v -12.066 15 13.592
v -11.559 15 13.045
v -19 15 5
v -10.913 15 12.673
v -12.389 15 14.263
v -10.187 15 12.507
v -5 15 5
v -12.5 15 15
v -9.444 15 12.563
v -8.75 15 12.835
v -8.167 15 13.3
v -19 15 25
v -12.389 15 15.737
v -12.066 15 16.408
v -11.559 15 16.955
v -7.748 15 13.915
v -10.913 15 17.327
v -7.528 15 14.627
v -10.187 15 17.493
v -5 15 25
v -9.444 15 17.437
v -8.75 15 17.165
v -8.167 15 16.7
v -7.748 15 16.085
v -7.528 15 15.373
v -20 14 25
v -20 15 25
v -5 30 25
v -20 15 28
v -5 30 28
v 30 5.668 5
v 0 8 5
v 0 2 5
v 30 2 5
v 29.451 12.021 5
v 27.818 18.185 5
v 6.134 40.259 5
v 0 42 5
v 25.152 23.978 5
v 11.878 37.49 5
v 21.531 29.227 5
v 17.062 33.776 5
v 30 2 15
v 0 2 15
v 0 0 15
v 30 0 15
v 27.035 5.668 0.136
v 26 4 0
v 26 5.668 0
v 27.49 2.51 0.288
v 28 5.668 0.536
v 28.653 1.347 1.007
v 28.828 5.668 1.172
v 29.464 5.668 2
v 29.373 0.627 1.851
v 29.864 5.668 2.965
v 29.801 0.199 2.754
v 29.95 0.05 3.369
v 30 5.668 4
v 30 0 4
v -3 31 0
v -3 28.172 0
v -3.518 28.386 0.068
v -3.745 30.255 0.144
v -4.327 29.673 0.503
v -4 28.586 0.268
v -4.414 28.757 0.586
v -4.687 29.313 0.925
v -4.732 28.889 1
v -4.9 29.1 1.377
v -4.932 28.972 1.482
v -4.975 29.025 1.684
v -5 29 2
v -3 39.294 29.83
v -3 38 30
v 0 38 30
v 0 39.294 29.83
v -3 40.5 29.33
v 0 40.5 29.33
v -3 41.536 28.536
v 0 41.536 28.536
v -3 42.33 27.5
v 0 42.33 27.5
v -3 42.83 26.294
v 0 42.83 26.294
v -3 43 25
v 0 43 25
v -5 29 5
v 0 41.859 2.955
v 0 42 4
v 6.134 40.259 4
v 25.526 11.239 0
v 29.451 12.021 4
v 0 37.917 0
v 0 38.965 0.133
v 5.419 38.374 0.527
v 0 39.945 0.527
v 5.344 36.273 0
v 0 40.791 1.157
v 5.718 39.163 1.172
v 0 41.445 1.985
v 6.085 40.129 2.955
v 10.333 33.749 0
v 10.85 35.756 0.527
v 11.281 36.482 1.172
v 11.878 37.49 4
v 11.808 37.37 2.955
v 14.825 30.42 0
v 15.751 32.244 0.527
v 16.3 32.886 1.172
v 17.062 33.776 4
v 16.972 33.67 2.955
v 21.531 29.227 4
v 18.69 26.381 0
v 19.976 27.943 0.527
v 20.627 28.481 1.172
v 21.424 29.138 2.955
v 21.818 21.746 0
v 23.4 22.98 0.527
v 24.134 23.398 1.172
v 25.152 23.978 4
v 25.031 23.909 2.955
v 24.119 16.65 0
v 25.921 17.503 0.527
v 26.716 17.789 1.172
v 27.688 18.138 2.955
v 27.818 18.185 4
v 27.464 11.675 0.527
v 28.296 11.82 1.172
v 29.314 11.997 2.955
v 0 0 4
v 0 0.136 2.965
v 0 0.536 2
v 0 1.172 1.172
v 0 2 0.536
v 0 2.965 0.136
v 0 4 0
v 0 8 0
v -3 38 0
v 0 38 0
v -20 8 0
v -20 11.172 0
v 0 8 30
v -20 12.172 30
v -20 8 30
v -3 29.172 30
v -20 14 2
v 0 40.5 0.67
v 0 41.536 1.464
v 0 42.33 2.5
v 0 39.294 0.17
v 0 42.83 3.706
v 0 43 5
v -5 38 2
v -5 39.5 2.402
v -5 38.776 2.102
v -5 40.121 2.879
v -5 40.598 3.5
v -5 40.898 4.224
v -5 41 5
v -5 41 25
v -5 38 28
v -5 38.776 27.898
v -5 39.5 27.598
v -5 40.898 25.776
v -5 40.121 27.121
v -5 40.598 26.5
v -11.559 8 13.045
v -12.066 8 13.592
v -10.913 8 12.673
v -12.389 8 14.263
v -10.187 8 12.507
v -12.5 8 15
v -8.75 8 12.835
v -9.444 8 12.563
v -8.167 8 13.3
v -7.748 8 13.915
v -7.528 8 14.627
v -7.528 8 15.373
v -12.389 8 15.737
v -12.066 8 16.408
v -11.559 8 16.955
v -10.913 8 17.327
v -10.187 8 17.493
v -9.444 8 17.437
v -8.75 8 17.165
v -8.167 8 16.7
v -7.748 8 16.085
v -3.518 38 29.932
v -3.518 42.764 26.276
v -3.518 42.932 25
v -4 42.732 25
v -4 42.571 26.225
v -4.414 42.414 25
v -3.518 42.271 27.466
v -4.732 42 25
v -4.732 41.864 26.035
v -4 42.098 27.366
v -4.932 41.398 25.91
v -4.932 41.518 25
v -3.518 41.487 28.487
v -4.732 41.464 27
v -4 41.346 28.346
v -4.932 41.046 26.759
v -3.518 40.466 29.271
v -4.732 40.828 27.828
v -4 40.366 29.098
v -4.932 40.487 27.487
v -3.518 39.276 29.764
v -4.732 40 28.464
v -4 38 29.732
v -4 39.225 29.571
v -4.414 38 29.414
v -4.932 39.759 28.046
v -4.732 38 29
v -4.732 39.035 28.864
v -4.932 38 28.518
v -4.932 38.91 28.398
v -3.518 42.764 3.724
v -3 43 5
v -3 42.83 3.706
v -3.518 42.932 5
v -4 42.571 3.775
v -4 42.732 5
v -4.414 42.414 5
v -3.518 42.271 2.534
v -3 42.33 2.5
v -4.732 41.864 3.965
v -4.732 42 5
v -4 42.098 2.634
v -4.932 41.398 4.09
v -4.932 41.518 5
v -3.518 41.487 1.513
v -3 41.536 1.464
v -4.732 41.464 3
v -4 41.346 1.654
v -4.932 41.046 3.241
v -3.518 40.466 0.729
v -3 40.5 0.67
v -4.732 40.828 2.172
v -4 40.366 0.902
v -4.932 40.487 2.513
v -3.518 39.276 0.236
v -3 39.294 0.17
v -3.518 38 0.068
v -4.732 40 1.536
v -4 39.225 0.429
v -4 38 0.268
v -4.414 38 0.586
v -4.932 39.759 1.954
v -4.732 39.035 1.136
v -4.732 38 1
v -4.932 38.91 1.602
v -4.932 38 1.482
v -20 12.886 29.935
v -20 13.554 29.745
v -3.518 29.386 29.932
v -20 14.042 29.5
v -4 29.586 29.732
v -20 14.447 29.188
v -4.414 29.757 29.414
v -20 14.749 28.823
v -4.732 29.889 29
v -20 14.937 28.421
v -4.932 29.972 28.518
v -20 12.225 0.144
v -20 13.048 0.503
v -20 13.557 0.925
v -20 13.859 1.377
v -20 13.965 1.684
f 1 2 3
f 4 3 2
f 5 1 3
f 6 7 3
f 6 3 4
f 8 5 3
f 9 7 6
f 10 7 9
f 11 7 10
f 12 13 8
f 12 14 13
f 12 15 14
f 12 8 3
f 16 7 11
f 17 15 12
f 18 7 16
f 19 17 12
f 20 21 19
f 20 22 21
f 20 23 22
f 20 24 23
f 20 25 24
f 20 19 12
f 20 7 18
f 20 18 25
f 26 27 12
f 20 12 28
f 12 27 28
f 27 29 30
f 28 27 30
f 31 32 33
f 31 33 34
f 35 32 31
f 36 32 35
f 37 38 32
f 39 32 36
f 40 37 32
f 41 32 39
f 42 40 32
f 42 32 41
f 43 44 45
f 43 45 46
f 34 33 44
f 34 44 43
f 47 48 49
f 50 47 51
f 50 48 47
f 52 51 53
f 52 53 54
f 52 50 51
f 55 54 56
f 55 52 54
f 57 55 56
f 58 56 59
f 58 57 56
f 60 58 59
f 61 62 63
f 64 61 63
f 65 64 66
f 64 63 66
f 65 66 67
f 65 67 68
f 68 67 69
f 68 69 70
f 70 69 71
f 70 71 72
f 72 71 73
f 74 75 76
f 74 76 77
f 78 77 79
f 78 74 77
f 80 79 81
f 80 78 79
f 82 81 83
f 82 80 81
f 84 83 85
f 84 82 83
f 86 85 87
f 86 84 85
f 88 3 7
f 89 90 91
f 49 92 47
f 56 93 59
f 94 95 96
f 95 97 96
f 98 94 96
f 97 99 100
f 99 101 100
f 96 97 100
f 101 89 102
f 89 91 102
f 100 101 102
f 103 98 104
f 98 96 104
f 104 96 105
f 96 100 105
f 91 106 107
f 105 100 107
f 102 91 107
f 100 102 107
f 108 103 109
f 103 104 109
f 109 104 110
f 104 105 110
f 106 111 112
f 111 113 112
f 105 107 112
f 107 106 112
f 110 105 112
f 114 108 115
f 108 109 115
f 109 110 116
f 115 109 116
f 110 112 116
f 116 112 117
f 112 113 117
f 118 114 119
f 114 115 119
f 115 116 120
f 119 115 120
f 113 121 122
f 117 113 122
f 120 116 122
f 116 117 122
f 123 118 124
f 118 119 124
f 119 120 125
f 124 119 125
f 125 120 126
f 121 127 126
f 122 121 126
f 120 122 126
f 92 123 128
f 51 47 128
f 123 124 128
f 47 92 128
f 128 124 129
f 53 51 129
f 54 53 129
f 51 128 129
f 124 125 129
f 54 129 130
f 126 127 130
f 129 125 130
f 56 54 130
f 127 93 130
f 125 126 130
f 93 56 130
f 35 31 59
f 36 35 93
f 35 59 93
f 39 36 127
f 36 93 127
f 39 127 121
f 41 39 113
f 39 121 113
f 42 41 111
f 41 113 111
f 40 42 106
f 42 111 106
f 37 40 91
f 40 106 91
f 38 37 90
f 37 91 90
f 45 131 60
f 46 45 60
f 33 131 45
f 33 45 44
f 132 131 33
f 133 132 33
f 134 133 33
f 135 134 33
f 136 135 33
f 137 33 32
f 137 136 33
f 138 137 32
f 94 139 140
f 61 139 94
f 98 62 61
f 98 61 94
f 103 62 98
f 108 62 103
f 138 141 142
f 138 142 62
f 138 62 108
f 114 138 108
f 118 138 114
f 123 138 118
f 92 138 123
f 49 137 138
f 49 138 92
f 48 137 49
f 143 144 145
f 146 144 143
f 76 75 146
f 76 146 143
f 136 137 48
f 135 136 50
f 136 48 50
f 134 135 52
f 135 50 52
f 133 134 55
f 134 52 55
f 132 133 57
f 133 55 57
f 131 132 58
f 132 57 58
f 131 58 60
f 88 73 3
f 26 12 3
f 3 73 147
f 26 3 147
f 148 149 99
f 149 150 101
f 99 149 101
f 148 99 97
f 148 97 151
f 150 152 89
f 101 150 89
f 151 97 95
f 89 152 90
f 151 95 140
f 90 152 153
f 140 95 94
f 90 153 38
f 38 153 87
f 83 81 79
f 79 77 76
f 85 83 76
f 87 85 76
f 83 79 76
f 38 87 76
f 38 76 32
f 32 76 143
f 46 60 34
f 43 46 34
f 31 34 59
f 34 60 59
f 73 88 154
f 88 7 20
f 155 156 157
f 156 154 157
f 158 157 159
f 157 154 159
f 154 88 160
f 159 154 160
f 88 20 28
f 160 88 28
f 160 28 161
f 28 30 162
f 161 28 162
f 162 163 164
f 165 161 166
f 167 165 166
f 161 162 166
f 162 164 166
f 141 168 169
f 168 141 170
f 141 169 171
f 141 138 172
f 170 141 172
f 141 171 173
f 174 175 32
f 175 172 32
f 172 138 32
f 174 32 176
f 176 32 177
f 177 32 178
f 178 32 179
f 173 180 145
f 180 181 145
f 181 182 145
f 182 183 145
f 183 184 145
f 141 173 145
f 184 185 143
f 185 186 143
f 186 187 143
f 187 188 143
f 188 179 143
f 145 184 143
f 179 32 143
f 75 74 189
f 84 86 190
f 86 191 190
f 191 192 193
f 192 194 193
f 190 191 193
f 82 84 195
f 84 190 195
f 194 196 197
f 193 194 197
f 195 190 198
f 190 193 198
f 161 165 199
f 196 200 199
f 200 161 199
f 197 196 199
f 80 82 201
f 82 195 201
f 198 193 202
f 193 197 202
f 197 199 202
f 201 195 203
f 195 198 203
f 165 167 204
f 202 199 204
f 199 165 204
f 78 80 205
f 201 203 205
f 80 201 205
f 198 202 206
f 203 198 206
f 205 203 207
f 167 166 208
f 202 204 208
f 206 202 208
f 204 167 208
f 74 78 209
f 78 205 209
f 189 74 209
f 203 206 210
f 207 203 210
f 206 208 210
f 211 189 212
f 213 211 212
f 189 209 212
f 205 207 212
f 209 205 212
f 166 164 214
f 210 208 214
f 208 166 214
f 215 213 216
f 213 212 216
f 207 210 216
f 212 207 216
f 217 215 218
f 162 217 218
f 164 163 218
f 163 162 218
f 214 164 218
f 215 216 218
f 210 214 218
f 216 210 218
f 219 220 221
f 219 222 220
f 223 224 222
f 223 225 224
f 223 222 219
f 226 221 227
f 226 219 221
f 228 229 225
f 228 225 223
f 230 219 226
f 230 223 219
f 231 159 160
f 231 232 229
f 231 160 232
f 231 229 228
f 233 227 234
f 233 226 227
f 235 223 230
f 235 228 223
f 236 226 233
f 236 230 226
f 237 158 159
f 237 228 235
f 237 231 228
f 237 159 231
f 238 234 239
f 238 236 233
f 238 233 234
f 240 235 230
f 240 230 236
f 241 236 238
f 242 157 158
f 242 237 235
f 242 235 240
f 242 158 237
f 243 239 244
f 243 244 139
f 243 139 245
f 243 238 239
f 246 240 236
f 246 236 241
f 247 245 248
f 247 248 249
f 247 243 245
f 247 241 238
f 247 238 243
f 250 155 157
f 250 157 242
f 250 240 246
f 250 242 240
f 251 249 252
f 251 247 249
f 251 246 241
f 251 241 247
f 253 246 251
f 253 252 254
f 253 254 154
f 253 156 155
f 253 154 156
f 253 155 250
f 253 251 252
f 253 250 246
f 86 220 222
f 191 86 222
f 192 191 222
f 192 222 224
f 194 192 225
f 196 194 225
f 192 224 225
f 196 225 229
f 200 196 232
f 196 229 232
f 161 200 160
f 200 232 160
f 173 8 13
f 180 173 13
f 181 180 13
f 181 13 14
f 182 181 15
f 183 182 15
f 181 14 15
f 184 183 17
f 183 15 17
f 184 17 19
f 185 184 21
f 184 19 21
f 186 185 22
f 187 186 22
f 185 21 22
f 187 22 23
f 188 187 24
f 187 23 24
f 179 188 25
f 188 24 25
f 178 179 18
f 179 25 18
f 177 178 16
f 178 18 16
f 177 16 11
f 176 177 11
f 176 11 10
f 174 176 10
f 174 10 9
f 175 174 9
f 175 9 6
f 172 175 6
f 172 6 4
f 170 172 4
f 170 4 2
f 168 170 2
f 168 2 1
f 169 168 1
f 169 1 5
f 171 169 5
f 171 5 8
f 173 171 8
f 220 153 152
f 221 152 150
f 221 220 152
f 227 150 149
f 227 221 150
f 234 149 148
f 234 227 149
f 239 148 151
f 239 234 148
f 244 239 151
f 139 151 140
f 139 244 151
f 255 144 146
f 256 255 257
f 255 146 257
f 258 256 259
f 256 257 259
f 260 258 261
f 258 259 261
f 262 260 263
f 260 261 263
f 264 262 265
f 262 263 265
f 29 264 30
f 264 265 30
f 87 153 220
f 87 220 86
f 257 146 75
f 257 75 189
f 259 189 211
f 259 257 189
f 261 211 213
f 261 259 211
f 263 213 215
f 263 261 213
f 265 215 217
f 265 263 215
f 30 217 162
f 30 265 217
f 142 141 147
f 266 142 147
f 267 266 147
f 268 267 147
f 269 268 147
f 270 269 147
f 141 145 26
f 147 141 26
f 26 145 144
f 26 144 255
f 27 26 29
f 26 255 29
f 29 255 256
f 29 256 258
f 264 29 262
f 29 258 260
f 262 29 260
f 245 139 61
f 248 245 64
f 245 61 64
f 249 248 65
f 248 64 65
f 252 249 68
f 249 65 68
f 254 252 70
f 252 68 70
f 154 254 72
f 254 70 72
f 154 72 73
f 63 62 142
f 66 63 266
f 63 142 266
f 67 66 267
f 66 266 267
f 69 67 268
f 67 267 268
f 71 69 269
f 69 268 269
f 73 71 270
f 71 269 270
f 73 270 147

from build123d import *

# Parameters (mm, degrees)
F0_W          = 30
F0_H          = 42
F1_DEPTH      = 5
F2_T1_DEPTH   = 186.6590212458
F3_W          = 30
F3_H          = 2
F4_DEPTH      = 10
F5_W          = 35
F5_H          = 30
F6_DEPTH      = 5
F7_W          = 7
F7_H          = 30
F8_DEPTH      = 15
F9_R          = 2.5
F10_DEPTH     = 10
F11_R         = 4
F12_W         = 15
F12_H         = 14
F13_DEPTH     = 5
F14_W         = 15
F14_H         = 15
F15_DEPTH     = 5
F16_T4_DEPTH  = 35.8601958556
F16_T9_DEPTH  = 35.8601958556
F17_R         = 5
F18_T1_DEPTH  = 20
F18_T6_DEPTH  = 9.5699020722
F18_T11_DEPTH = 31.2132034356
F18_T16_DEPTH = 31.2132034356
F18_T21_DEPTH = 14
F18_T24_ANGLE = 90
F18_T26_ANGLE = 90
F18_T30_DEPTH = 13
F18_T36_DEPTH = 14
F18_T40_DEPTH = 31.2132034356
F18_T47_DEPTH = 13
F18_T51_DEPTH = 31.2132034356


# Not quite as in the source:
# - a fillet or chamfer that OpenCascade refuses, or shapes differently, is made with other operations: its cross-section is extruded or revolved along the edge and cut away or added


with BuildPart() as f1:
    # F0 (on Top) → F1 (new body)
    with BuildSketch(Plane.XY):
        with Locations((15, 21)):
            Rectangle(F0_W, F0_H)
    extrude(amount=F1_DEPTH)

    # F2: fillet of radius 37 on 1 edges, made by hand

    # F2_s2 → F2_t1 (cut)
    with BuildSketch(Plane.XY.offset(-90.8295106229)):
        with BuildLine():
            ThreePointArc((30, 5.6681957508), (21.5306852354, 29.2266337296), (0, 42))
            Line((0, 42), (30, 42))
            Line((30, 42), (30, 5.6681957508))
        make_face()
    extrude(amount=F2_T1_DEPTH, mode=Mode.SUBTRACT)

    # F3 (on face) → F4 (join)
    with BuildSketch(Plane.XY.offset(5)):
        with Locations((15, 1)):
            Rectangle(F3_W, F3_H)
    extrude(amount=F4_DEPTH)

    # F5 (on face) → F6 (join)
    with BuildSketch(Plane(origin=(0, 0, 0), x_dir=(0, -1, 0), z_dir=(-1, 0, 0))):
        with Locations((-25.5, 15)):
            Rectangle(F5_W, F5_H)
    extrude(amount=F6_DEPTH)

    # F7 (on face) → F8 (join)
    with BuildSketch(Plane(origin=(-5, 0, 0), x_dir=(0, -1, 0), z_dir=(-1, 0, 0))):
        with Locations((-11.5, 15)):
            Rectangle(F7_W, F7_H)
    extrude(amount=F8_DEPTH)

    # F9 (on face) → F10 (cut)
    with BuildSketch(Plane(origin=(0, 15, 0), x_dir=(-1, 0, 0), z_dir=(0, 1, 0))):
        with Locations((10, 15)):
            Circle(F9_R)
    extrude(amount=-F10_DEPTH, mode=Mode.SUBTRACT)

    # F11
    f11_edges = [f1.edges().sort_by_distance(p)[0] for p in [
        (21.530685, 29.226634, 0),
        (15, 0, 0),
    ]]
    fillet(f11_edges, radius=F11_R)

    # F12 (on face) → F13 (join)
    with BuildSketch(Plane(origin=(0, 0, 0), x_dir=(1, 0, 0), z_dir=(0, 0, -1))):
        with Locations((-12.5, -22)):
            Rectangle(F12_W, F12_H)
    extrude(amount=-F13_DEPTH)

    # F14 (on face) → F15 (join)
    with BuildSketch(Plane.XY.offset(30)):
        with Locations((-12.5, 22.5)):
            Rectangle(F14_W, F14_H)
    extrude(amount=-F15_DEPTH)

    # F16: chamfer of 15 on 2 edges, made by hand


with BuildPart() as f16_tool2:
    # F16_s3 → F16_t4 (new body)
    with BuildSketch(Plane.XY.offset(45.4300979278)):
        with BuildLine():
            Line((-20.4242640687, 14.5757359313), (-4.5757359313, 30.4242640687))
            Line((-4.5757359313, 30.4242640687), (-4.5757359313, 30.7242640687))
            ThreePointArc((-4.5757359313, 30.7242640687), (-12.2878679656, 30.3), (-20, 30.3))
            Line((-20, 30.3), (-20.3, 30))
            ThreePointArc((-20.3, 30), (-20.3, 22.2878679656), (-20.7242640687, 14.5757359313))
            Line((-20.7242640687, 14.5757359313), (-20.4242640687, 14.5757359313))
        make_face()
    extrude(amount=-F16_T4_DEPTH)

    split(bisect_by=Plane.YZ.offset(-5), keep=Keep.BOTTOM)


with BuildPart() as f1_1:
    add(f1.part)

    # F16_t1: cut F16_tool2
    add(f16_tool2.part, mode=Mode.SUBTRACT)


with BuildPart() as f16_tool7:
    # F16_s8 → F16_t9 (new body)
    with BuildSketch(Plane.XY.offset(-15.4300979278)):
        with BuildLine():
            Line((-4.5757359313, 29.4242640687), (-20.4242640687, 13.5757359313))
            Line((-20.4242640687, 13.5757359313), (-20.7242640687, 13.5757359313))
            ThreePointArc((-20.7242640687, 13.5757359313), (-20.3, 21.2878679656), (-20.3, 29))
            Line((-20.3, 29), (-20, 29.3))
            ThreePointArc((-20, 29.3), (-12.2878679656, 29.3), (-4.5757359313, 29.7242640687))
            Line((-4.5757359313, 29.7242640687), (-4.5757359313, 29.4242640687))
        make_face()
    extrude(amount=F16_T9_DEPTH)

    split(bisect_by=Plane.YZ.offset(-5), keep=Keep.BOTTOM)


with BuildPart() as f1_2:
    add(f1_1.part)

    # F16_t6: cut F16_tool7
    add(f16_tool7.part, mode=Mode.SUBTRACT)

    # F17
    f17_edges = [f1_2.edges().sort_by_distance(p)[0] for p in [
        (-2.5, 43, 0),
        (-2.5, 43, 30),
    ]]
    fillet(f17_edges, radius=F17_R)

    # F18: fillet of radius 2 on 9 edges, made by hand

    # F18_s2 → F18_t1 (cut)
    with BuildSketch(Plane.XY.offset(5)):
        with BuildLine():
            ThreePointArc((-3, 43), (-4.4142135624, 42.4142135624), (-5, 41))
            Line((-5, 41), (-5, 43))
            Line((-5, 43), (-3, 43))
        make_face()
    extrude(amount=F18_T1_DEPTH, mode=Mode.SUBTRACT)


with BuildPart() as f18_tool4:
    # F18_s5 → F18_t6 (new body)
    with BuildSketch(Plane.XY.offset(25)):
        with BuildLine():
            ThreePointArc((-20, 13), (-19.4142135624, 14.4142135624), (-18, 15))
            Line((-18, 15), (-20, 15))
            Line((-20, 15), (-20, 13))
        make_face()
    extrude(amount=-F18_T6_DEPTH)

    split(bisect_by=Plane(origin=(-17, 17, 0), x_dir=(0, 0, 1), z_dir=(-0.7071067812, 0.7071067812, 0)), keep=Keep.TOP)


with BuildPart() as f1_3:
    add(f1_2.part)

    # F18_t3: cut F18_tool4
    add(f18_tool4.part, mode=Mode.SUBTRACT)


with BuildPart() as f18_tool9:
    # F18_s10 → F18_t11 (new body)
    with BuildSketch(Plane(origin=(-6.5355339059, -6.5355339059, 0), x_dir=(0, 0, 1), z_dir=(0.7071067812, 0.7071067812, 0))):
        with BuildLine():
            ThreePointArc((0, -22.0416305603), (0.5857864376, -23.4558441227), (2, -24.0416305603))
            Line((2, -24.0416305603), (0, -24.0416305603))
            Line((0, -24.0416305603), (0, -22.0416305603))
        make_face()
    extrude(amount=F18_T11_DEPTH)

    split(bisect_by=Plane.YZ.offset(-5), keep=Keep.BOTTOM)


with BuildPart() as f1_4:
    add(f1_3.part)

    # F18_t8: cut F18_tool9
    add(f18_tool9.part, mode=Mode.SUBTRACT)


with BuildPart() as f18_tool14:
    # F18_s15 → F18_t16 (new body)
    with BuildSketch(Plane(origin=(16.0355339059, 16.0355339059, 0), x_dir=(0, 0, 1), z_dir=(-0.7071067812, -0.7071067812, 0))):
        with BuildLine():
            ThreePointArc((30, 22.7487373415), (29.4142135624, 24.1629509039), (28, 24.7487373415))
            Line((28, 24.7487373415), (30, 24.7487373415))
            Line((30, 24.7487373415), (30, 22.7487373415))
        make_face()
    extrude(amount=F18_T16_DEPTH)

    split(bisect_by=Plane.YZ.offset(-5), keep=Keep.BOTTOM)


with BuildPart() as f1_5:
    add(f1_4.part)

    # F18_t13: cut F18_tool14
    add(f18_tool14.part, mode=Mode.SUBTRACT)


with BuildPart() as f18_tool19:
    # F18_s20 → F18_t21 (new body)
    with BuildSketch(Plane.XZ.offset(-24)):
        with BuildLine():
            ThreePointArc((-3, 0), (-4.4142135624, 0.5857864376), (-5, 2))
            Line((-5, 2), (-5, 0))
            Line((-5, 0), (-3, 0))
        make_face()
    extrude(amount=-F18_T21_DEPTH)

    split(bisect_by=Plane(origin=(-17, 17, 0), x_dir=(0, 0, 1), z_dir=(-0.7071067812, 0.7071067812, 0)), keep=Keep.TOP)


with BuildPart() as f1_6:
    add(f1_5.part)

    # F18_t18: cut F18_tool19
    add(f18_tool19.part, mode=Mode.SUBTRACT)

    # F18_s23 → F18_t24 (revolve, cut)
    with BuildSketch(Plane.XY.offset(5)):
        with BuildLine():
            ThreePointArc((-3, 43), (-4.4142135624, 42.4142135624), (-5, 41))
            Line((-5, 41), (-5, 43))
            Line((-5, 43), (-3, 43))
        make_face()
    revolve(axis=Axis((-5, 38, 5), (-1, 0, 0)), revolution_arc=F18_T24_ANGLE, mode=Mode.SUBTRACT)

    # F18_s25 → F18_t26 (revolve, cut)
    with BuildSketch(Plane.XY.offset(25)):
        with BuildLine():
            ThreePointArc((-3, 43), (-4.4142135624, 42.4142135624), (-5, 41))
            Line((-5, 41), (-5, 43))
            Line((-5, 43), (-3, 43))
        make_face()
    revolve(axis=Axis((-5, 38, 25), (1, 0, 0)), revolution_arc=F18_T26_ANGLE, mode=Mode.SUBTRACT)


with BuildPart() as f18_tool28:
    # F18_s29 → F18_t30 (new body)
    with BuildSketch(Plane.XZ.offset(-25)):
        with BuildLine():
            ThreePointArc((-3, 30), (-4.4142135624, 29.4142135624), (-5, 28))
            Line((-5, 28), (-5, 30))
            Line((-5, 30), (-3, 30))
        make_face()
    extrude(amount=-F18_T30_DEPTH)

    split(bisect_by=Plane(origin=(-17.5, 17.5, 0), x_dir=(0, 0, 1), z_dir=(-0.7071067812, 0.7071067812, 0)), keep=Keep.TOP)


with BuildPart() as f1_7:
    add(f1_6.part)

    # F18_t27: cut F18_tool28
    add(f18_tool28.part, mode=Mode.SUBTRACT)


with BuildPart() as f18_tool34:
    # F18_s35 → F18_t36 (new body)
    with BuildSketch(Plane.XZ.offset(-24)):
        with BuildLine():
            ThreePointArc((-3, 0), (-4.4142135624, 0.5857864376), (-5, 2))
            Line((-5, 2), (-5, 0))
            Line((-5, 0), (-3, 0))
        make_face()
    extrude(amount=-F18_T36_DEPTH)

    split(bisect_by=Plane(origin=(-17, 17, 0), x_dir=(0, 0, 1), z_dir=(0.7071067812, -0.7071067812, 0)), keep=Keep.TOP)


with BuildPart() as f18_tool38:
    # F18_s39 → F18_t40 (new body)
    with BuildSketch(Plane(origin=(-6.5355339059, -6.5355339059, 0), x_dir=(0, 0, 1), z_dir=(0.7071067812, 0.7071067812, 0))):
        with BuildLine():
            ThreePointArc((0, -22.0416305603), (0.5857864376, -23.4558441227), (2, -24.0416305603))
            Line((2, -24.0416305603), (0, -24.0416305603))
            Line((0, -24.0416305603), (0, -22.0416305603))
        make_face()
    extrude(amount=F18_T40_DEPTH)

    split(bisect_by=Plane.YZ.offset(-5), keep=Keep.TOP)


with BuildPart() as f18_tool34_1:
    add(f18_tool34.part)

    # F18_t42: intersect F18_tool38
    add(f18_tool38.part, mode=Mode.INTERSECT)


with BuildPart() as f1_8:
    add(f1_7.part)

    # F18_t32: cut F18_tool34
    add(f18_tool34_1.part, mode=Mode.SUBTRACT)


with BuildPart() as f18_tool45:
    # F18_s46 → F18_t47 (new body)
    with BuildSketch(Plane.XZ.offset(-25)):
        with BuildLine():
            ThreePointArc((-3, 30), (-4.4142135624, 29.4142135624), (-5, 28))
            Line((-5, 28), (-5, 30))
            Line((-5, 30), (-3, 30))
        make_face()
    extrude(amount=-F18_T47_DEPTH)

    split(bisect_by=Plane(origin=(-17.5, 17.5, 0), x_dir=(0, 0, 1), z_dir=(0.7071067812, -0.7071067812, 0)), keep=Keep.TOP)


with BuildPart() as f18_tool49:
    # F18_s50 → F18_t51 (new body)
    with BuildSketch(Plane(origin=(16.0355339059, 16.0355339059, 0), x_dir=(0, 0, 1), z_dir=(-0.7071067812, -0.7071067812, 0))):
        with BuildLine():
            ThreePointArc((30, 22.7487373415), (29.4142135624, 24.1629509039), (28, 24.7487373415))
            Line((28, 24.7487373415), (30, 24.7487373415))
            Line((30, 24.7487373415), (30, 22.7487373415))
        make_face()
    extrude(amount=F18_T51_DEPTH)

    split(bisect_by=Plane.YZ.offset(-5), keep=Keep.TOP)


with BuildPart() as f18_tool45_1:
    add(f18_tool45.part)

    # F18_t53: intersect F18_tool49
    add(f18_tool49.part, mode=Mode.INTERSECT)


with BuildPart() as f1_9:
    add(f1_8.part)

    # F18_t43: cut F18_tool45
    add(f18_tool45_1.part, mode=Mode.SUBTRACT)


solid = f1_9.part
